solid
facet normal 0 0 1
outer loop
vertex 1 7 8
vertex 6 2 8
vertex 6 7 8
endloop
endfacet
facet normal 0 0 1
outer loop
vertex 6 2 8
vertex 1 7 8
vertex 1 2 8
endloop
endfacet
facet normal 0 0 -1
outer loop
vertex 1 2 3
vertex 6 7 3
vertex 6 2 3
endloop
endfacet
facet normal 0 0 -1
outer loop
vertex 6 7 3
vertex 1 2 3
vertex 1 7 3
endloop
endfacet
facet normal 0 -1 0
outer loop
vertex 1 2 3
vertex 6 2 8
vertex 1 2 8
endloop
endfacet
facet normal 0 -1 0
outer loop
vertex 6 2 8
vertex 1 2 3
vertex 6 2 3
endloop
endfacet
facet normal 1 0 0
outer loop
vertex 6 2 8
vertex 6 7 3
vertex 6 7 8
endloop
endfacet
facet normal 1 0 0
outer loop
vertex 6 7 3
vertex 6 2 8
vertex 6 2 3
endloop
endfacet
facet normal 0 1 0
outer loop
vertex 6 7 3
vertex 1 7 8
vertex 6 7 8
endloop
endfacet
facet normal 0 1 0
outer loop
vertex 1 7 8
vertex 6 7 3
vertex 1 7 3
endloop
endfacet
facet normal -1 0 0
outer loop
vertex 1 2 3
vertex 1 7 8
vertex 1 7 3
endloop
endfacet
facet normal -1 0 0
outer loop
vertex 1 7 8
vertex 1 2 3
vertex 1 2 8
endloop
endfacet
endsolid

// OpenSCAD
// Volume: 125, SurfaceArea: 150
// Simple translated cube
translate([1, 2, 3]) cube(5);
